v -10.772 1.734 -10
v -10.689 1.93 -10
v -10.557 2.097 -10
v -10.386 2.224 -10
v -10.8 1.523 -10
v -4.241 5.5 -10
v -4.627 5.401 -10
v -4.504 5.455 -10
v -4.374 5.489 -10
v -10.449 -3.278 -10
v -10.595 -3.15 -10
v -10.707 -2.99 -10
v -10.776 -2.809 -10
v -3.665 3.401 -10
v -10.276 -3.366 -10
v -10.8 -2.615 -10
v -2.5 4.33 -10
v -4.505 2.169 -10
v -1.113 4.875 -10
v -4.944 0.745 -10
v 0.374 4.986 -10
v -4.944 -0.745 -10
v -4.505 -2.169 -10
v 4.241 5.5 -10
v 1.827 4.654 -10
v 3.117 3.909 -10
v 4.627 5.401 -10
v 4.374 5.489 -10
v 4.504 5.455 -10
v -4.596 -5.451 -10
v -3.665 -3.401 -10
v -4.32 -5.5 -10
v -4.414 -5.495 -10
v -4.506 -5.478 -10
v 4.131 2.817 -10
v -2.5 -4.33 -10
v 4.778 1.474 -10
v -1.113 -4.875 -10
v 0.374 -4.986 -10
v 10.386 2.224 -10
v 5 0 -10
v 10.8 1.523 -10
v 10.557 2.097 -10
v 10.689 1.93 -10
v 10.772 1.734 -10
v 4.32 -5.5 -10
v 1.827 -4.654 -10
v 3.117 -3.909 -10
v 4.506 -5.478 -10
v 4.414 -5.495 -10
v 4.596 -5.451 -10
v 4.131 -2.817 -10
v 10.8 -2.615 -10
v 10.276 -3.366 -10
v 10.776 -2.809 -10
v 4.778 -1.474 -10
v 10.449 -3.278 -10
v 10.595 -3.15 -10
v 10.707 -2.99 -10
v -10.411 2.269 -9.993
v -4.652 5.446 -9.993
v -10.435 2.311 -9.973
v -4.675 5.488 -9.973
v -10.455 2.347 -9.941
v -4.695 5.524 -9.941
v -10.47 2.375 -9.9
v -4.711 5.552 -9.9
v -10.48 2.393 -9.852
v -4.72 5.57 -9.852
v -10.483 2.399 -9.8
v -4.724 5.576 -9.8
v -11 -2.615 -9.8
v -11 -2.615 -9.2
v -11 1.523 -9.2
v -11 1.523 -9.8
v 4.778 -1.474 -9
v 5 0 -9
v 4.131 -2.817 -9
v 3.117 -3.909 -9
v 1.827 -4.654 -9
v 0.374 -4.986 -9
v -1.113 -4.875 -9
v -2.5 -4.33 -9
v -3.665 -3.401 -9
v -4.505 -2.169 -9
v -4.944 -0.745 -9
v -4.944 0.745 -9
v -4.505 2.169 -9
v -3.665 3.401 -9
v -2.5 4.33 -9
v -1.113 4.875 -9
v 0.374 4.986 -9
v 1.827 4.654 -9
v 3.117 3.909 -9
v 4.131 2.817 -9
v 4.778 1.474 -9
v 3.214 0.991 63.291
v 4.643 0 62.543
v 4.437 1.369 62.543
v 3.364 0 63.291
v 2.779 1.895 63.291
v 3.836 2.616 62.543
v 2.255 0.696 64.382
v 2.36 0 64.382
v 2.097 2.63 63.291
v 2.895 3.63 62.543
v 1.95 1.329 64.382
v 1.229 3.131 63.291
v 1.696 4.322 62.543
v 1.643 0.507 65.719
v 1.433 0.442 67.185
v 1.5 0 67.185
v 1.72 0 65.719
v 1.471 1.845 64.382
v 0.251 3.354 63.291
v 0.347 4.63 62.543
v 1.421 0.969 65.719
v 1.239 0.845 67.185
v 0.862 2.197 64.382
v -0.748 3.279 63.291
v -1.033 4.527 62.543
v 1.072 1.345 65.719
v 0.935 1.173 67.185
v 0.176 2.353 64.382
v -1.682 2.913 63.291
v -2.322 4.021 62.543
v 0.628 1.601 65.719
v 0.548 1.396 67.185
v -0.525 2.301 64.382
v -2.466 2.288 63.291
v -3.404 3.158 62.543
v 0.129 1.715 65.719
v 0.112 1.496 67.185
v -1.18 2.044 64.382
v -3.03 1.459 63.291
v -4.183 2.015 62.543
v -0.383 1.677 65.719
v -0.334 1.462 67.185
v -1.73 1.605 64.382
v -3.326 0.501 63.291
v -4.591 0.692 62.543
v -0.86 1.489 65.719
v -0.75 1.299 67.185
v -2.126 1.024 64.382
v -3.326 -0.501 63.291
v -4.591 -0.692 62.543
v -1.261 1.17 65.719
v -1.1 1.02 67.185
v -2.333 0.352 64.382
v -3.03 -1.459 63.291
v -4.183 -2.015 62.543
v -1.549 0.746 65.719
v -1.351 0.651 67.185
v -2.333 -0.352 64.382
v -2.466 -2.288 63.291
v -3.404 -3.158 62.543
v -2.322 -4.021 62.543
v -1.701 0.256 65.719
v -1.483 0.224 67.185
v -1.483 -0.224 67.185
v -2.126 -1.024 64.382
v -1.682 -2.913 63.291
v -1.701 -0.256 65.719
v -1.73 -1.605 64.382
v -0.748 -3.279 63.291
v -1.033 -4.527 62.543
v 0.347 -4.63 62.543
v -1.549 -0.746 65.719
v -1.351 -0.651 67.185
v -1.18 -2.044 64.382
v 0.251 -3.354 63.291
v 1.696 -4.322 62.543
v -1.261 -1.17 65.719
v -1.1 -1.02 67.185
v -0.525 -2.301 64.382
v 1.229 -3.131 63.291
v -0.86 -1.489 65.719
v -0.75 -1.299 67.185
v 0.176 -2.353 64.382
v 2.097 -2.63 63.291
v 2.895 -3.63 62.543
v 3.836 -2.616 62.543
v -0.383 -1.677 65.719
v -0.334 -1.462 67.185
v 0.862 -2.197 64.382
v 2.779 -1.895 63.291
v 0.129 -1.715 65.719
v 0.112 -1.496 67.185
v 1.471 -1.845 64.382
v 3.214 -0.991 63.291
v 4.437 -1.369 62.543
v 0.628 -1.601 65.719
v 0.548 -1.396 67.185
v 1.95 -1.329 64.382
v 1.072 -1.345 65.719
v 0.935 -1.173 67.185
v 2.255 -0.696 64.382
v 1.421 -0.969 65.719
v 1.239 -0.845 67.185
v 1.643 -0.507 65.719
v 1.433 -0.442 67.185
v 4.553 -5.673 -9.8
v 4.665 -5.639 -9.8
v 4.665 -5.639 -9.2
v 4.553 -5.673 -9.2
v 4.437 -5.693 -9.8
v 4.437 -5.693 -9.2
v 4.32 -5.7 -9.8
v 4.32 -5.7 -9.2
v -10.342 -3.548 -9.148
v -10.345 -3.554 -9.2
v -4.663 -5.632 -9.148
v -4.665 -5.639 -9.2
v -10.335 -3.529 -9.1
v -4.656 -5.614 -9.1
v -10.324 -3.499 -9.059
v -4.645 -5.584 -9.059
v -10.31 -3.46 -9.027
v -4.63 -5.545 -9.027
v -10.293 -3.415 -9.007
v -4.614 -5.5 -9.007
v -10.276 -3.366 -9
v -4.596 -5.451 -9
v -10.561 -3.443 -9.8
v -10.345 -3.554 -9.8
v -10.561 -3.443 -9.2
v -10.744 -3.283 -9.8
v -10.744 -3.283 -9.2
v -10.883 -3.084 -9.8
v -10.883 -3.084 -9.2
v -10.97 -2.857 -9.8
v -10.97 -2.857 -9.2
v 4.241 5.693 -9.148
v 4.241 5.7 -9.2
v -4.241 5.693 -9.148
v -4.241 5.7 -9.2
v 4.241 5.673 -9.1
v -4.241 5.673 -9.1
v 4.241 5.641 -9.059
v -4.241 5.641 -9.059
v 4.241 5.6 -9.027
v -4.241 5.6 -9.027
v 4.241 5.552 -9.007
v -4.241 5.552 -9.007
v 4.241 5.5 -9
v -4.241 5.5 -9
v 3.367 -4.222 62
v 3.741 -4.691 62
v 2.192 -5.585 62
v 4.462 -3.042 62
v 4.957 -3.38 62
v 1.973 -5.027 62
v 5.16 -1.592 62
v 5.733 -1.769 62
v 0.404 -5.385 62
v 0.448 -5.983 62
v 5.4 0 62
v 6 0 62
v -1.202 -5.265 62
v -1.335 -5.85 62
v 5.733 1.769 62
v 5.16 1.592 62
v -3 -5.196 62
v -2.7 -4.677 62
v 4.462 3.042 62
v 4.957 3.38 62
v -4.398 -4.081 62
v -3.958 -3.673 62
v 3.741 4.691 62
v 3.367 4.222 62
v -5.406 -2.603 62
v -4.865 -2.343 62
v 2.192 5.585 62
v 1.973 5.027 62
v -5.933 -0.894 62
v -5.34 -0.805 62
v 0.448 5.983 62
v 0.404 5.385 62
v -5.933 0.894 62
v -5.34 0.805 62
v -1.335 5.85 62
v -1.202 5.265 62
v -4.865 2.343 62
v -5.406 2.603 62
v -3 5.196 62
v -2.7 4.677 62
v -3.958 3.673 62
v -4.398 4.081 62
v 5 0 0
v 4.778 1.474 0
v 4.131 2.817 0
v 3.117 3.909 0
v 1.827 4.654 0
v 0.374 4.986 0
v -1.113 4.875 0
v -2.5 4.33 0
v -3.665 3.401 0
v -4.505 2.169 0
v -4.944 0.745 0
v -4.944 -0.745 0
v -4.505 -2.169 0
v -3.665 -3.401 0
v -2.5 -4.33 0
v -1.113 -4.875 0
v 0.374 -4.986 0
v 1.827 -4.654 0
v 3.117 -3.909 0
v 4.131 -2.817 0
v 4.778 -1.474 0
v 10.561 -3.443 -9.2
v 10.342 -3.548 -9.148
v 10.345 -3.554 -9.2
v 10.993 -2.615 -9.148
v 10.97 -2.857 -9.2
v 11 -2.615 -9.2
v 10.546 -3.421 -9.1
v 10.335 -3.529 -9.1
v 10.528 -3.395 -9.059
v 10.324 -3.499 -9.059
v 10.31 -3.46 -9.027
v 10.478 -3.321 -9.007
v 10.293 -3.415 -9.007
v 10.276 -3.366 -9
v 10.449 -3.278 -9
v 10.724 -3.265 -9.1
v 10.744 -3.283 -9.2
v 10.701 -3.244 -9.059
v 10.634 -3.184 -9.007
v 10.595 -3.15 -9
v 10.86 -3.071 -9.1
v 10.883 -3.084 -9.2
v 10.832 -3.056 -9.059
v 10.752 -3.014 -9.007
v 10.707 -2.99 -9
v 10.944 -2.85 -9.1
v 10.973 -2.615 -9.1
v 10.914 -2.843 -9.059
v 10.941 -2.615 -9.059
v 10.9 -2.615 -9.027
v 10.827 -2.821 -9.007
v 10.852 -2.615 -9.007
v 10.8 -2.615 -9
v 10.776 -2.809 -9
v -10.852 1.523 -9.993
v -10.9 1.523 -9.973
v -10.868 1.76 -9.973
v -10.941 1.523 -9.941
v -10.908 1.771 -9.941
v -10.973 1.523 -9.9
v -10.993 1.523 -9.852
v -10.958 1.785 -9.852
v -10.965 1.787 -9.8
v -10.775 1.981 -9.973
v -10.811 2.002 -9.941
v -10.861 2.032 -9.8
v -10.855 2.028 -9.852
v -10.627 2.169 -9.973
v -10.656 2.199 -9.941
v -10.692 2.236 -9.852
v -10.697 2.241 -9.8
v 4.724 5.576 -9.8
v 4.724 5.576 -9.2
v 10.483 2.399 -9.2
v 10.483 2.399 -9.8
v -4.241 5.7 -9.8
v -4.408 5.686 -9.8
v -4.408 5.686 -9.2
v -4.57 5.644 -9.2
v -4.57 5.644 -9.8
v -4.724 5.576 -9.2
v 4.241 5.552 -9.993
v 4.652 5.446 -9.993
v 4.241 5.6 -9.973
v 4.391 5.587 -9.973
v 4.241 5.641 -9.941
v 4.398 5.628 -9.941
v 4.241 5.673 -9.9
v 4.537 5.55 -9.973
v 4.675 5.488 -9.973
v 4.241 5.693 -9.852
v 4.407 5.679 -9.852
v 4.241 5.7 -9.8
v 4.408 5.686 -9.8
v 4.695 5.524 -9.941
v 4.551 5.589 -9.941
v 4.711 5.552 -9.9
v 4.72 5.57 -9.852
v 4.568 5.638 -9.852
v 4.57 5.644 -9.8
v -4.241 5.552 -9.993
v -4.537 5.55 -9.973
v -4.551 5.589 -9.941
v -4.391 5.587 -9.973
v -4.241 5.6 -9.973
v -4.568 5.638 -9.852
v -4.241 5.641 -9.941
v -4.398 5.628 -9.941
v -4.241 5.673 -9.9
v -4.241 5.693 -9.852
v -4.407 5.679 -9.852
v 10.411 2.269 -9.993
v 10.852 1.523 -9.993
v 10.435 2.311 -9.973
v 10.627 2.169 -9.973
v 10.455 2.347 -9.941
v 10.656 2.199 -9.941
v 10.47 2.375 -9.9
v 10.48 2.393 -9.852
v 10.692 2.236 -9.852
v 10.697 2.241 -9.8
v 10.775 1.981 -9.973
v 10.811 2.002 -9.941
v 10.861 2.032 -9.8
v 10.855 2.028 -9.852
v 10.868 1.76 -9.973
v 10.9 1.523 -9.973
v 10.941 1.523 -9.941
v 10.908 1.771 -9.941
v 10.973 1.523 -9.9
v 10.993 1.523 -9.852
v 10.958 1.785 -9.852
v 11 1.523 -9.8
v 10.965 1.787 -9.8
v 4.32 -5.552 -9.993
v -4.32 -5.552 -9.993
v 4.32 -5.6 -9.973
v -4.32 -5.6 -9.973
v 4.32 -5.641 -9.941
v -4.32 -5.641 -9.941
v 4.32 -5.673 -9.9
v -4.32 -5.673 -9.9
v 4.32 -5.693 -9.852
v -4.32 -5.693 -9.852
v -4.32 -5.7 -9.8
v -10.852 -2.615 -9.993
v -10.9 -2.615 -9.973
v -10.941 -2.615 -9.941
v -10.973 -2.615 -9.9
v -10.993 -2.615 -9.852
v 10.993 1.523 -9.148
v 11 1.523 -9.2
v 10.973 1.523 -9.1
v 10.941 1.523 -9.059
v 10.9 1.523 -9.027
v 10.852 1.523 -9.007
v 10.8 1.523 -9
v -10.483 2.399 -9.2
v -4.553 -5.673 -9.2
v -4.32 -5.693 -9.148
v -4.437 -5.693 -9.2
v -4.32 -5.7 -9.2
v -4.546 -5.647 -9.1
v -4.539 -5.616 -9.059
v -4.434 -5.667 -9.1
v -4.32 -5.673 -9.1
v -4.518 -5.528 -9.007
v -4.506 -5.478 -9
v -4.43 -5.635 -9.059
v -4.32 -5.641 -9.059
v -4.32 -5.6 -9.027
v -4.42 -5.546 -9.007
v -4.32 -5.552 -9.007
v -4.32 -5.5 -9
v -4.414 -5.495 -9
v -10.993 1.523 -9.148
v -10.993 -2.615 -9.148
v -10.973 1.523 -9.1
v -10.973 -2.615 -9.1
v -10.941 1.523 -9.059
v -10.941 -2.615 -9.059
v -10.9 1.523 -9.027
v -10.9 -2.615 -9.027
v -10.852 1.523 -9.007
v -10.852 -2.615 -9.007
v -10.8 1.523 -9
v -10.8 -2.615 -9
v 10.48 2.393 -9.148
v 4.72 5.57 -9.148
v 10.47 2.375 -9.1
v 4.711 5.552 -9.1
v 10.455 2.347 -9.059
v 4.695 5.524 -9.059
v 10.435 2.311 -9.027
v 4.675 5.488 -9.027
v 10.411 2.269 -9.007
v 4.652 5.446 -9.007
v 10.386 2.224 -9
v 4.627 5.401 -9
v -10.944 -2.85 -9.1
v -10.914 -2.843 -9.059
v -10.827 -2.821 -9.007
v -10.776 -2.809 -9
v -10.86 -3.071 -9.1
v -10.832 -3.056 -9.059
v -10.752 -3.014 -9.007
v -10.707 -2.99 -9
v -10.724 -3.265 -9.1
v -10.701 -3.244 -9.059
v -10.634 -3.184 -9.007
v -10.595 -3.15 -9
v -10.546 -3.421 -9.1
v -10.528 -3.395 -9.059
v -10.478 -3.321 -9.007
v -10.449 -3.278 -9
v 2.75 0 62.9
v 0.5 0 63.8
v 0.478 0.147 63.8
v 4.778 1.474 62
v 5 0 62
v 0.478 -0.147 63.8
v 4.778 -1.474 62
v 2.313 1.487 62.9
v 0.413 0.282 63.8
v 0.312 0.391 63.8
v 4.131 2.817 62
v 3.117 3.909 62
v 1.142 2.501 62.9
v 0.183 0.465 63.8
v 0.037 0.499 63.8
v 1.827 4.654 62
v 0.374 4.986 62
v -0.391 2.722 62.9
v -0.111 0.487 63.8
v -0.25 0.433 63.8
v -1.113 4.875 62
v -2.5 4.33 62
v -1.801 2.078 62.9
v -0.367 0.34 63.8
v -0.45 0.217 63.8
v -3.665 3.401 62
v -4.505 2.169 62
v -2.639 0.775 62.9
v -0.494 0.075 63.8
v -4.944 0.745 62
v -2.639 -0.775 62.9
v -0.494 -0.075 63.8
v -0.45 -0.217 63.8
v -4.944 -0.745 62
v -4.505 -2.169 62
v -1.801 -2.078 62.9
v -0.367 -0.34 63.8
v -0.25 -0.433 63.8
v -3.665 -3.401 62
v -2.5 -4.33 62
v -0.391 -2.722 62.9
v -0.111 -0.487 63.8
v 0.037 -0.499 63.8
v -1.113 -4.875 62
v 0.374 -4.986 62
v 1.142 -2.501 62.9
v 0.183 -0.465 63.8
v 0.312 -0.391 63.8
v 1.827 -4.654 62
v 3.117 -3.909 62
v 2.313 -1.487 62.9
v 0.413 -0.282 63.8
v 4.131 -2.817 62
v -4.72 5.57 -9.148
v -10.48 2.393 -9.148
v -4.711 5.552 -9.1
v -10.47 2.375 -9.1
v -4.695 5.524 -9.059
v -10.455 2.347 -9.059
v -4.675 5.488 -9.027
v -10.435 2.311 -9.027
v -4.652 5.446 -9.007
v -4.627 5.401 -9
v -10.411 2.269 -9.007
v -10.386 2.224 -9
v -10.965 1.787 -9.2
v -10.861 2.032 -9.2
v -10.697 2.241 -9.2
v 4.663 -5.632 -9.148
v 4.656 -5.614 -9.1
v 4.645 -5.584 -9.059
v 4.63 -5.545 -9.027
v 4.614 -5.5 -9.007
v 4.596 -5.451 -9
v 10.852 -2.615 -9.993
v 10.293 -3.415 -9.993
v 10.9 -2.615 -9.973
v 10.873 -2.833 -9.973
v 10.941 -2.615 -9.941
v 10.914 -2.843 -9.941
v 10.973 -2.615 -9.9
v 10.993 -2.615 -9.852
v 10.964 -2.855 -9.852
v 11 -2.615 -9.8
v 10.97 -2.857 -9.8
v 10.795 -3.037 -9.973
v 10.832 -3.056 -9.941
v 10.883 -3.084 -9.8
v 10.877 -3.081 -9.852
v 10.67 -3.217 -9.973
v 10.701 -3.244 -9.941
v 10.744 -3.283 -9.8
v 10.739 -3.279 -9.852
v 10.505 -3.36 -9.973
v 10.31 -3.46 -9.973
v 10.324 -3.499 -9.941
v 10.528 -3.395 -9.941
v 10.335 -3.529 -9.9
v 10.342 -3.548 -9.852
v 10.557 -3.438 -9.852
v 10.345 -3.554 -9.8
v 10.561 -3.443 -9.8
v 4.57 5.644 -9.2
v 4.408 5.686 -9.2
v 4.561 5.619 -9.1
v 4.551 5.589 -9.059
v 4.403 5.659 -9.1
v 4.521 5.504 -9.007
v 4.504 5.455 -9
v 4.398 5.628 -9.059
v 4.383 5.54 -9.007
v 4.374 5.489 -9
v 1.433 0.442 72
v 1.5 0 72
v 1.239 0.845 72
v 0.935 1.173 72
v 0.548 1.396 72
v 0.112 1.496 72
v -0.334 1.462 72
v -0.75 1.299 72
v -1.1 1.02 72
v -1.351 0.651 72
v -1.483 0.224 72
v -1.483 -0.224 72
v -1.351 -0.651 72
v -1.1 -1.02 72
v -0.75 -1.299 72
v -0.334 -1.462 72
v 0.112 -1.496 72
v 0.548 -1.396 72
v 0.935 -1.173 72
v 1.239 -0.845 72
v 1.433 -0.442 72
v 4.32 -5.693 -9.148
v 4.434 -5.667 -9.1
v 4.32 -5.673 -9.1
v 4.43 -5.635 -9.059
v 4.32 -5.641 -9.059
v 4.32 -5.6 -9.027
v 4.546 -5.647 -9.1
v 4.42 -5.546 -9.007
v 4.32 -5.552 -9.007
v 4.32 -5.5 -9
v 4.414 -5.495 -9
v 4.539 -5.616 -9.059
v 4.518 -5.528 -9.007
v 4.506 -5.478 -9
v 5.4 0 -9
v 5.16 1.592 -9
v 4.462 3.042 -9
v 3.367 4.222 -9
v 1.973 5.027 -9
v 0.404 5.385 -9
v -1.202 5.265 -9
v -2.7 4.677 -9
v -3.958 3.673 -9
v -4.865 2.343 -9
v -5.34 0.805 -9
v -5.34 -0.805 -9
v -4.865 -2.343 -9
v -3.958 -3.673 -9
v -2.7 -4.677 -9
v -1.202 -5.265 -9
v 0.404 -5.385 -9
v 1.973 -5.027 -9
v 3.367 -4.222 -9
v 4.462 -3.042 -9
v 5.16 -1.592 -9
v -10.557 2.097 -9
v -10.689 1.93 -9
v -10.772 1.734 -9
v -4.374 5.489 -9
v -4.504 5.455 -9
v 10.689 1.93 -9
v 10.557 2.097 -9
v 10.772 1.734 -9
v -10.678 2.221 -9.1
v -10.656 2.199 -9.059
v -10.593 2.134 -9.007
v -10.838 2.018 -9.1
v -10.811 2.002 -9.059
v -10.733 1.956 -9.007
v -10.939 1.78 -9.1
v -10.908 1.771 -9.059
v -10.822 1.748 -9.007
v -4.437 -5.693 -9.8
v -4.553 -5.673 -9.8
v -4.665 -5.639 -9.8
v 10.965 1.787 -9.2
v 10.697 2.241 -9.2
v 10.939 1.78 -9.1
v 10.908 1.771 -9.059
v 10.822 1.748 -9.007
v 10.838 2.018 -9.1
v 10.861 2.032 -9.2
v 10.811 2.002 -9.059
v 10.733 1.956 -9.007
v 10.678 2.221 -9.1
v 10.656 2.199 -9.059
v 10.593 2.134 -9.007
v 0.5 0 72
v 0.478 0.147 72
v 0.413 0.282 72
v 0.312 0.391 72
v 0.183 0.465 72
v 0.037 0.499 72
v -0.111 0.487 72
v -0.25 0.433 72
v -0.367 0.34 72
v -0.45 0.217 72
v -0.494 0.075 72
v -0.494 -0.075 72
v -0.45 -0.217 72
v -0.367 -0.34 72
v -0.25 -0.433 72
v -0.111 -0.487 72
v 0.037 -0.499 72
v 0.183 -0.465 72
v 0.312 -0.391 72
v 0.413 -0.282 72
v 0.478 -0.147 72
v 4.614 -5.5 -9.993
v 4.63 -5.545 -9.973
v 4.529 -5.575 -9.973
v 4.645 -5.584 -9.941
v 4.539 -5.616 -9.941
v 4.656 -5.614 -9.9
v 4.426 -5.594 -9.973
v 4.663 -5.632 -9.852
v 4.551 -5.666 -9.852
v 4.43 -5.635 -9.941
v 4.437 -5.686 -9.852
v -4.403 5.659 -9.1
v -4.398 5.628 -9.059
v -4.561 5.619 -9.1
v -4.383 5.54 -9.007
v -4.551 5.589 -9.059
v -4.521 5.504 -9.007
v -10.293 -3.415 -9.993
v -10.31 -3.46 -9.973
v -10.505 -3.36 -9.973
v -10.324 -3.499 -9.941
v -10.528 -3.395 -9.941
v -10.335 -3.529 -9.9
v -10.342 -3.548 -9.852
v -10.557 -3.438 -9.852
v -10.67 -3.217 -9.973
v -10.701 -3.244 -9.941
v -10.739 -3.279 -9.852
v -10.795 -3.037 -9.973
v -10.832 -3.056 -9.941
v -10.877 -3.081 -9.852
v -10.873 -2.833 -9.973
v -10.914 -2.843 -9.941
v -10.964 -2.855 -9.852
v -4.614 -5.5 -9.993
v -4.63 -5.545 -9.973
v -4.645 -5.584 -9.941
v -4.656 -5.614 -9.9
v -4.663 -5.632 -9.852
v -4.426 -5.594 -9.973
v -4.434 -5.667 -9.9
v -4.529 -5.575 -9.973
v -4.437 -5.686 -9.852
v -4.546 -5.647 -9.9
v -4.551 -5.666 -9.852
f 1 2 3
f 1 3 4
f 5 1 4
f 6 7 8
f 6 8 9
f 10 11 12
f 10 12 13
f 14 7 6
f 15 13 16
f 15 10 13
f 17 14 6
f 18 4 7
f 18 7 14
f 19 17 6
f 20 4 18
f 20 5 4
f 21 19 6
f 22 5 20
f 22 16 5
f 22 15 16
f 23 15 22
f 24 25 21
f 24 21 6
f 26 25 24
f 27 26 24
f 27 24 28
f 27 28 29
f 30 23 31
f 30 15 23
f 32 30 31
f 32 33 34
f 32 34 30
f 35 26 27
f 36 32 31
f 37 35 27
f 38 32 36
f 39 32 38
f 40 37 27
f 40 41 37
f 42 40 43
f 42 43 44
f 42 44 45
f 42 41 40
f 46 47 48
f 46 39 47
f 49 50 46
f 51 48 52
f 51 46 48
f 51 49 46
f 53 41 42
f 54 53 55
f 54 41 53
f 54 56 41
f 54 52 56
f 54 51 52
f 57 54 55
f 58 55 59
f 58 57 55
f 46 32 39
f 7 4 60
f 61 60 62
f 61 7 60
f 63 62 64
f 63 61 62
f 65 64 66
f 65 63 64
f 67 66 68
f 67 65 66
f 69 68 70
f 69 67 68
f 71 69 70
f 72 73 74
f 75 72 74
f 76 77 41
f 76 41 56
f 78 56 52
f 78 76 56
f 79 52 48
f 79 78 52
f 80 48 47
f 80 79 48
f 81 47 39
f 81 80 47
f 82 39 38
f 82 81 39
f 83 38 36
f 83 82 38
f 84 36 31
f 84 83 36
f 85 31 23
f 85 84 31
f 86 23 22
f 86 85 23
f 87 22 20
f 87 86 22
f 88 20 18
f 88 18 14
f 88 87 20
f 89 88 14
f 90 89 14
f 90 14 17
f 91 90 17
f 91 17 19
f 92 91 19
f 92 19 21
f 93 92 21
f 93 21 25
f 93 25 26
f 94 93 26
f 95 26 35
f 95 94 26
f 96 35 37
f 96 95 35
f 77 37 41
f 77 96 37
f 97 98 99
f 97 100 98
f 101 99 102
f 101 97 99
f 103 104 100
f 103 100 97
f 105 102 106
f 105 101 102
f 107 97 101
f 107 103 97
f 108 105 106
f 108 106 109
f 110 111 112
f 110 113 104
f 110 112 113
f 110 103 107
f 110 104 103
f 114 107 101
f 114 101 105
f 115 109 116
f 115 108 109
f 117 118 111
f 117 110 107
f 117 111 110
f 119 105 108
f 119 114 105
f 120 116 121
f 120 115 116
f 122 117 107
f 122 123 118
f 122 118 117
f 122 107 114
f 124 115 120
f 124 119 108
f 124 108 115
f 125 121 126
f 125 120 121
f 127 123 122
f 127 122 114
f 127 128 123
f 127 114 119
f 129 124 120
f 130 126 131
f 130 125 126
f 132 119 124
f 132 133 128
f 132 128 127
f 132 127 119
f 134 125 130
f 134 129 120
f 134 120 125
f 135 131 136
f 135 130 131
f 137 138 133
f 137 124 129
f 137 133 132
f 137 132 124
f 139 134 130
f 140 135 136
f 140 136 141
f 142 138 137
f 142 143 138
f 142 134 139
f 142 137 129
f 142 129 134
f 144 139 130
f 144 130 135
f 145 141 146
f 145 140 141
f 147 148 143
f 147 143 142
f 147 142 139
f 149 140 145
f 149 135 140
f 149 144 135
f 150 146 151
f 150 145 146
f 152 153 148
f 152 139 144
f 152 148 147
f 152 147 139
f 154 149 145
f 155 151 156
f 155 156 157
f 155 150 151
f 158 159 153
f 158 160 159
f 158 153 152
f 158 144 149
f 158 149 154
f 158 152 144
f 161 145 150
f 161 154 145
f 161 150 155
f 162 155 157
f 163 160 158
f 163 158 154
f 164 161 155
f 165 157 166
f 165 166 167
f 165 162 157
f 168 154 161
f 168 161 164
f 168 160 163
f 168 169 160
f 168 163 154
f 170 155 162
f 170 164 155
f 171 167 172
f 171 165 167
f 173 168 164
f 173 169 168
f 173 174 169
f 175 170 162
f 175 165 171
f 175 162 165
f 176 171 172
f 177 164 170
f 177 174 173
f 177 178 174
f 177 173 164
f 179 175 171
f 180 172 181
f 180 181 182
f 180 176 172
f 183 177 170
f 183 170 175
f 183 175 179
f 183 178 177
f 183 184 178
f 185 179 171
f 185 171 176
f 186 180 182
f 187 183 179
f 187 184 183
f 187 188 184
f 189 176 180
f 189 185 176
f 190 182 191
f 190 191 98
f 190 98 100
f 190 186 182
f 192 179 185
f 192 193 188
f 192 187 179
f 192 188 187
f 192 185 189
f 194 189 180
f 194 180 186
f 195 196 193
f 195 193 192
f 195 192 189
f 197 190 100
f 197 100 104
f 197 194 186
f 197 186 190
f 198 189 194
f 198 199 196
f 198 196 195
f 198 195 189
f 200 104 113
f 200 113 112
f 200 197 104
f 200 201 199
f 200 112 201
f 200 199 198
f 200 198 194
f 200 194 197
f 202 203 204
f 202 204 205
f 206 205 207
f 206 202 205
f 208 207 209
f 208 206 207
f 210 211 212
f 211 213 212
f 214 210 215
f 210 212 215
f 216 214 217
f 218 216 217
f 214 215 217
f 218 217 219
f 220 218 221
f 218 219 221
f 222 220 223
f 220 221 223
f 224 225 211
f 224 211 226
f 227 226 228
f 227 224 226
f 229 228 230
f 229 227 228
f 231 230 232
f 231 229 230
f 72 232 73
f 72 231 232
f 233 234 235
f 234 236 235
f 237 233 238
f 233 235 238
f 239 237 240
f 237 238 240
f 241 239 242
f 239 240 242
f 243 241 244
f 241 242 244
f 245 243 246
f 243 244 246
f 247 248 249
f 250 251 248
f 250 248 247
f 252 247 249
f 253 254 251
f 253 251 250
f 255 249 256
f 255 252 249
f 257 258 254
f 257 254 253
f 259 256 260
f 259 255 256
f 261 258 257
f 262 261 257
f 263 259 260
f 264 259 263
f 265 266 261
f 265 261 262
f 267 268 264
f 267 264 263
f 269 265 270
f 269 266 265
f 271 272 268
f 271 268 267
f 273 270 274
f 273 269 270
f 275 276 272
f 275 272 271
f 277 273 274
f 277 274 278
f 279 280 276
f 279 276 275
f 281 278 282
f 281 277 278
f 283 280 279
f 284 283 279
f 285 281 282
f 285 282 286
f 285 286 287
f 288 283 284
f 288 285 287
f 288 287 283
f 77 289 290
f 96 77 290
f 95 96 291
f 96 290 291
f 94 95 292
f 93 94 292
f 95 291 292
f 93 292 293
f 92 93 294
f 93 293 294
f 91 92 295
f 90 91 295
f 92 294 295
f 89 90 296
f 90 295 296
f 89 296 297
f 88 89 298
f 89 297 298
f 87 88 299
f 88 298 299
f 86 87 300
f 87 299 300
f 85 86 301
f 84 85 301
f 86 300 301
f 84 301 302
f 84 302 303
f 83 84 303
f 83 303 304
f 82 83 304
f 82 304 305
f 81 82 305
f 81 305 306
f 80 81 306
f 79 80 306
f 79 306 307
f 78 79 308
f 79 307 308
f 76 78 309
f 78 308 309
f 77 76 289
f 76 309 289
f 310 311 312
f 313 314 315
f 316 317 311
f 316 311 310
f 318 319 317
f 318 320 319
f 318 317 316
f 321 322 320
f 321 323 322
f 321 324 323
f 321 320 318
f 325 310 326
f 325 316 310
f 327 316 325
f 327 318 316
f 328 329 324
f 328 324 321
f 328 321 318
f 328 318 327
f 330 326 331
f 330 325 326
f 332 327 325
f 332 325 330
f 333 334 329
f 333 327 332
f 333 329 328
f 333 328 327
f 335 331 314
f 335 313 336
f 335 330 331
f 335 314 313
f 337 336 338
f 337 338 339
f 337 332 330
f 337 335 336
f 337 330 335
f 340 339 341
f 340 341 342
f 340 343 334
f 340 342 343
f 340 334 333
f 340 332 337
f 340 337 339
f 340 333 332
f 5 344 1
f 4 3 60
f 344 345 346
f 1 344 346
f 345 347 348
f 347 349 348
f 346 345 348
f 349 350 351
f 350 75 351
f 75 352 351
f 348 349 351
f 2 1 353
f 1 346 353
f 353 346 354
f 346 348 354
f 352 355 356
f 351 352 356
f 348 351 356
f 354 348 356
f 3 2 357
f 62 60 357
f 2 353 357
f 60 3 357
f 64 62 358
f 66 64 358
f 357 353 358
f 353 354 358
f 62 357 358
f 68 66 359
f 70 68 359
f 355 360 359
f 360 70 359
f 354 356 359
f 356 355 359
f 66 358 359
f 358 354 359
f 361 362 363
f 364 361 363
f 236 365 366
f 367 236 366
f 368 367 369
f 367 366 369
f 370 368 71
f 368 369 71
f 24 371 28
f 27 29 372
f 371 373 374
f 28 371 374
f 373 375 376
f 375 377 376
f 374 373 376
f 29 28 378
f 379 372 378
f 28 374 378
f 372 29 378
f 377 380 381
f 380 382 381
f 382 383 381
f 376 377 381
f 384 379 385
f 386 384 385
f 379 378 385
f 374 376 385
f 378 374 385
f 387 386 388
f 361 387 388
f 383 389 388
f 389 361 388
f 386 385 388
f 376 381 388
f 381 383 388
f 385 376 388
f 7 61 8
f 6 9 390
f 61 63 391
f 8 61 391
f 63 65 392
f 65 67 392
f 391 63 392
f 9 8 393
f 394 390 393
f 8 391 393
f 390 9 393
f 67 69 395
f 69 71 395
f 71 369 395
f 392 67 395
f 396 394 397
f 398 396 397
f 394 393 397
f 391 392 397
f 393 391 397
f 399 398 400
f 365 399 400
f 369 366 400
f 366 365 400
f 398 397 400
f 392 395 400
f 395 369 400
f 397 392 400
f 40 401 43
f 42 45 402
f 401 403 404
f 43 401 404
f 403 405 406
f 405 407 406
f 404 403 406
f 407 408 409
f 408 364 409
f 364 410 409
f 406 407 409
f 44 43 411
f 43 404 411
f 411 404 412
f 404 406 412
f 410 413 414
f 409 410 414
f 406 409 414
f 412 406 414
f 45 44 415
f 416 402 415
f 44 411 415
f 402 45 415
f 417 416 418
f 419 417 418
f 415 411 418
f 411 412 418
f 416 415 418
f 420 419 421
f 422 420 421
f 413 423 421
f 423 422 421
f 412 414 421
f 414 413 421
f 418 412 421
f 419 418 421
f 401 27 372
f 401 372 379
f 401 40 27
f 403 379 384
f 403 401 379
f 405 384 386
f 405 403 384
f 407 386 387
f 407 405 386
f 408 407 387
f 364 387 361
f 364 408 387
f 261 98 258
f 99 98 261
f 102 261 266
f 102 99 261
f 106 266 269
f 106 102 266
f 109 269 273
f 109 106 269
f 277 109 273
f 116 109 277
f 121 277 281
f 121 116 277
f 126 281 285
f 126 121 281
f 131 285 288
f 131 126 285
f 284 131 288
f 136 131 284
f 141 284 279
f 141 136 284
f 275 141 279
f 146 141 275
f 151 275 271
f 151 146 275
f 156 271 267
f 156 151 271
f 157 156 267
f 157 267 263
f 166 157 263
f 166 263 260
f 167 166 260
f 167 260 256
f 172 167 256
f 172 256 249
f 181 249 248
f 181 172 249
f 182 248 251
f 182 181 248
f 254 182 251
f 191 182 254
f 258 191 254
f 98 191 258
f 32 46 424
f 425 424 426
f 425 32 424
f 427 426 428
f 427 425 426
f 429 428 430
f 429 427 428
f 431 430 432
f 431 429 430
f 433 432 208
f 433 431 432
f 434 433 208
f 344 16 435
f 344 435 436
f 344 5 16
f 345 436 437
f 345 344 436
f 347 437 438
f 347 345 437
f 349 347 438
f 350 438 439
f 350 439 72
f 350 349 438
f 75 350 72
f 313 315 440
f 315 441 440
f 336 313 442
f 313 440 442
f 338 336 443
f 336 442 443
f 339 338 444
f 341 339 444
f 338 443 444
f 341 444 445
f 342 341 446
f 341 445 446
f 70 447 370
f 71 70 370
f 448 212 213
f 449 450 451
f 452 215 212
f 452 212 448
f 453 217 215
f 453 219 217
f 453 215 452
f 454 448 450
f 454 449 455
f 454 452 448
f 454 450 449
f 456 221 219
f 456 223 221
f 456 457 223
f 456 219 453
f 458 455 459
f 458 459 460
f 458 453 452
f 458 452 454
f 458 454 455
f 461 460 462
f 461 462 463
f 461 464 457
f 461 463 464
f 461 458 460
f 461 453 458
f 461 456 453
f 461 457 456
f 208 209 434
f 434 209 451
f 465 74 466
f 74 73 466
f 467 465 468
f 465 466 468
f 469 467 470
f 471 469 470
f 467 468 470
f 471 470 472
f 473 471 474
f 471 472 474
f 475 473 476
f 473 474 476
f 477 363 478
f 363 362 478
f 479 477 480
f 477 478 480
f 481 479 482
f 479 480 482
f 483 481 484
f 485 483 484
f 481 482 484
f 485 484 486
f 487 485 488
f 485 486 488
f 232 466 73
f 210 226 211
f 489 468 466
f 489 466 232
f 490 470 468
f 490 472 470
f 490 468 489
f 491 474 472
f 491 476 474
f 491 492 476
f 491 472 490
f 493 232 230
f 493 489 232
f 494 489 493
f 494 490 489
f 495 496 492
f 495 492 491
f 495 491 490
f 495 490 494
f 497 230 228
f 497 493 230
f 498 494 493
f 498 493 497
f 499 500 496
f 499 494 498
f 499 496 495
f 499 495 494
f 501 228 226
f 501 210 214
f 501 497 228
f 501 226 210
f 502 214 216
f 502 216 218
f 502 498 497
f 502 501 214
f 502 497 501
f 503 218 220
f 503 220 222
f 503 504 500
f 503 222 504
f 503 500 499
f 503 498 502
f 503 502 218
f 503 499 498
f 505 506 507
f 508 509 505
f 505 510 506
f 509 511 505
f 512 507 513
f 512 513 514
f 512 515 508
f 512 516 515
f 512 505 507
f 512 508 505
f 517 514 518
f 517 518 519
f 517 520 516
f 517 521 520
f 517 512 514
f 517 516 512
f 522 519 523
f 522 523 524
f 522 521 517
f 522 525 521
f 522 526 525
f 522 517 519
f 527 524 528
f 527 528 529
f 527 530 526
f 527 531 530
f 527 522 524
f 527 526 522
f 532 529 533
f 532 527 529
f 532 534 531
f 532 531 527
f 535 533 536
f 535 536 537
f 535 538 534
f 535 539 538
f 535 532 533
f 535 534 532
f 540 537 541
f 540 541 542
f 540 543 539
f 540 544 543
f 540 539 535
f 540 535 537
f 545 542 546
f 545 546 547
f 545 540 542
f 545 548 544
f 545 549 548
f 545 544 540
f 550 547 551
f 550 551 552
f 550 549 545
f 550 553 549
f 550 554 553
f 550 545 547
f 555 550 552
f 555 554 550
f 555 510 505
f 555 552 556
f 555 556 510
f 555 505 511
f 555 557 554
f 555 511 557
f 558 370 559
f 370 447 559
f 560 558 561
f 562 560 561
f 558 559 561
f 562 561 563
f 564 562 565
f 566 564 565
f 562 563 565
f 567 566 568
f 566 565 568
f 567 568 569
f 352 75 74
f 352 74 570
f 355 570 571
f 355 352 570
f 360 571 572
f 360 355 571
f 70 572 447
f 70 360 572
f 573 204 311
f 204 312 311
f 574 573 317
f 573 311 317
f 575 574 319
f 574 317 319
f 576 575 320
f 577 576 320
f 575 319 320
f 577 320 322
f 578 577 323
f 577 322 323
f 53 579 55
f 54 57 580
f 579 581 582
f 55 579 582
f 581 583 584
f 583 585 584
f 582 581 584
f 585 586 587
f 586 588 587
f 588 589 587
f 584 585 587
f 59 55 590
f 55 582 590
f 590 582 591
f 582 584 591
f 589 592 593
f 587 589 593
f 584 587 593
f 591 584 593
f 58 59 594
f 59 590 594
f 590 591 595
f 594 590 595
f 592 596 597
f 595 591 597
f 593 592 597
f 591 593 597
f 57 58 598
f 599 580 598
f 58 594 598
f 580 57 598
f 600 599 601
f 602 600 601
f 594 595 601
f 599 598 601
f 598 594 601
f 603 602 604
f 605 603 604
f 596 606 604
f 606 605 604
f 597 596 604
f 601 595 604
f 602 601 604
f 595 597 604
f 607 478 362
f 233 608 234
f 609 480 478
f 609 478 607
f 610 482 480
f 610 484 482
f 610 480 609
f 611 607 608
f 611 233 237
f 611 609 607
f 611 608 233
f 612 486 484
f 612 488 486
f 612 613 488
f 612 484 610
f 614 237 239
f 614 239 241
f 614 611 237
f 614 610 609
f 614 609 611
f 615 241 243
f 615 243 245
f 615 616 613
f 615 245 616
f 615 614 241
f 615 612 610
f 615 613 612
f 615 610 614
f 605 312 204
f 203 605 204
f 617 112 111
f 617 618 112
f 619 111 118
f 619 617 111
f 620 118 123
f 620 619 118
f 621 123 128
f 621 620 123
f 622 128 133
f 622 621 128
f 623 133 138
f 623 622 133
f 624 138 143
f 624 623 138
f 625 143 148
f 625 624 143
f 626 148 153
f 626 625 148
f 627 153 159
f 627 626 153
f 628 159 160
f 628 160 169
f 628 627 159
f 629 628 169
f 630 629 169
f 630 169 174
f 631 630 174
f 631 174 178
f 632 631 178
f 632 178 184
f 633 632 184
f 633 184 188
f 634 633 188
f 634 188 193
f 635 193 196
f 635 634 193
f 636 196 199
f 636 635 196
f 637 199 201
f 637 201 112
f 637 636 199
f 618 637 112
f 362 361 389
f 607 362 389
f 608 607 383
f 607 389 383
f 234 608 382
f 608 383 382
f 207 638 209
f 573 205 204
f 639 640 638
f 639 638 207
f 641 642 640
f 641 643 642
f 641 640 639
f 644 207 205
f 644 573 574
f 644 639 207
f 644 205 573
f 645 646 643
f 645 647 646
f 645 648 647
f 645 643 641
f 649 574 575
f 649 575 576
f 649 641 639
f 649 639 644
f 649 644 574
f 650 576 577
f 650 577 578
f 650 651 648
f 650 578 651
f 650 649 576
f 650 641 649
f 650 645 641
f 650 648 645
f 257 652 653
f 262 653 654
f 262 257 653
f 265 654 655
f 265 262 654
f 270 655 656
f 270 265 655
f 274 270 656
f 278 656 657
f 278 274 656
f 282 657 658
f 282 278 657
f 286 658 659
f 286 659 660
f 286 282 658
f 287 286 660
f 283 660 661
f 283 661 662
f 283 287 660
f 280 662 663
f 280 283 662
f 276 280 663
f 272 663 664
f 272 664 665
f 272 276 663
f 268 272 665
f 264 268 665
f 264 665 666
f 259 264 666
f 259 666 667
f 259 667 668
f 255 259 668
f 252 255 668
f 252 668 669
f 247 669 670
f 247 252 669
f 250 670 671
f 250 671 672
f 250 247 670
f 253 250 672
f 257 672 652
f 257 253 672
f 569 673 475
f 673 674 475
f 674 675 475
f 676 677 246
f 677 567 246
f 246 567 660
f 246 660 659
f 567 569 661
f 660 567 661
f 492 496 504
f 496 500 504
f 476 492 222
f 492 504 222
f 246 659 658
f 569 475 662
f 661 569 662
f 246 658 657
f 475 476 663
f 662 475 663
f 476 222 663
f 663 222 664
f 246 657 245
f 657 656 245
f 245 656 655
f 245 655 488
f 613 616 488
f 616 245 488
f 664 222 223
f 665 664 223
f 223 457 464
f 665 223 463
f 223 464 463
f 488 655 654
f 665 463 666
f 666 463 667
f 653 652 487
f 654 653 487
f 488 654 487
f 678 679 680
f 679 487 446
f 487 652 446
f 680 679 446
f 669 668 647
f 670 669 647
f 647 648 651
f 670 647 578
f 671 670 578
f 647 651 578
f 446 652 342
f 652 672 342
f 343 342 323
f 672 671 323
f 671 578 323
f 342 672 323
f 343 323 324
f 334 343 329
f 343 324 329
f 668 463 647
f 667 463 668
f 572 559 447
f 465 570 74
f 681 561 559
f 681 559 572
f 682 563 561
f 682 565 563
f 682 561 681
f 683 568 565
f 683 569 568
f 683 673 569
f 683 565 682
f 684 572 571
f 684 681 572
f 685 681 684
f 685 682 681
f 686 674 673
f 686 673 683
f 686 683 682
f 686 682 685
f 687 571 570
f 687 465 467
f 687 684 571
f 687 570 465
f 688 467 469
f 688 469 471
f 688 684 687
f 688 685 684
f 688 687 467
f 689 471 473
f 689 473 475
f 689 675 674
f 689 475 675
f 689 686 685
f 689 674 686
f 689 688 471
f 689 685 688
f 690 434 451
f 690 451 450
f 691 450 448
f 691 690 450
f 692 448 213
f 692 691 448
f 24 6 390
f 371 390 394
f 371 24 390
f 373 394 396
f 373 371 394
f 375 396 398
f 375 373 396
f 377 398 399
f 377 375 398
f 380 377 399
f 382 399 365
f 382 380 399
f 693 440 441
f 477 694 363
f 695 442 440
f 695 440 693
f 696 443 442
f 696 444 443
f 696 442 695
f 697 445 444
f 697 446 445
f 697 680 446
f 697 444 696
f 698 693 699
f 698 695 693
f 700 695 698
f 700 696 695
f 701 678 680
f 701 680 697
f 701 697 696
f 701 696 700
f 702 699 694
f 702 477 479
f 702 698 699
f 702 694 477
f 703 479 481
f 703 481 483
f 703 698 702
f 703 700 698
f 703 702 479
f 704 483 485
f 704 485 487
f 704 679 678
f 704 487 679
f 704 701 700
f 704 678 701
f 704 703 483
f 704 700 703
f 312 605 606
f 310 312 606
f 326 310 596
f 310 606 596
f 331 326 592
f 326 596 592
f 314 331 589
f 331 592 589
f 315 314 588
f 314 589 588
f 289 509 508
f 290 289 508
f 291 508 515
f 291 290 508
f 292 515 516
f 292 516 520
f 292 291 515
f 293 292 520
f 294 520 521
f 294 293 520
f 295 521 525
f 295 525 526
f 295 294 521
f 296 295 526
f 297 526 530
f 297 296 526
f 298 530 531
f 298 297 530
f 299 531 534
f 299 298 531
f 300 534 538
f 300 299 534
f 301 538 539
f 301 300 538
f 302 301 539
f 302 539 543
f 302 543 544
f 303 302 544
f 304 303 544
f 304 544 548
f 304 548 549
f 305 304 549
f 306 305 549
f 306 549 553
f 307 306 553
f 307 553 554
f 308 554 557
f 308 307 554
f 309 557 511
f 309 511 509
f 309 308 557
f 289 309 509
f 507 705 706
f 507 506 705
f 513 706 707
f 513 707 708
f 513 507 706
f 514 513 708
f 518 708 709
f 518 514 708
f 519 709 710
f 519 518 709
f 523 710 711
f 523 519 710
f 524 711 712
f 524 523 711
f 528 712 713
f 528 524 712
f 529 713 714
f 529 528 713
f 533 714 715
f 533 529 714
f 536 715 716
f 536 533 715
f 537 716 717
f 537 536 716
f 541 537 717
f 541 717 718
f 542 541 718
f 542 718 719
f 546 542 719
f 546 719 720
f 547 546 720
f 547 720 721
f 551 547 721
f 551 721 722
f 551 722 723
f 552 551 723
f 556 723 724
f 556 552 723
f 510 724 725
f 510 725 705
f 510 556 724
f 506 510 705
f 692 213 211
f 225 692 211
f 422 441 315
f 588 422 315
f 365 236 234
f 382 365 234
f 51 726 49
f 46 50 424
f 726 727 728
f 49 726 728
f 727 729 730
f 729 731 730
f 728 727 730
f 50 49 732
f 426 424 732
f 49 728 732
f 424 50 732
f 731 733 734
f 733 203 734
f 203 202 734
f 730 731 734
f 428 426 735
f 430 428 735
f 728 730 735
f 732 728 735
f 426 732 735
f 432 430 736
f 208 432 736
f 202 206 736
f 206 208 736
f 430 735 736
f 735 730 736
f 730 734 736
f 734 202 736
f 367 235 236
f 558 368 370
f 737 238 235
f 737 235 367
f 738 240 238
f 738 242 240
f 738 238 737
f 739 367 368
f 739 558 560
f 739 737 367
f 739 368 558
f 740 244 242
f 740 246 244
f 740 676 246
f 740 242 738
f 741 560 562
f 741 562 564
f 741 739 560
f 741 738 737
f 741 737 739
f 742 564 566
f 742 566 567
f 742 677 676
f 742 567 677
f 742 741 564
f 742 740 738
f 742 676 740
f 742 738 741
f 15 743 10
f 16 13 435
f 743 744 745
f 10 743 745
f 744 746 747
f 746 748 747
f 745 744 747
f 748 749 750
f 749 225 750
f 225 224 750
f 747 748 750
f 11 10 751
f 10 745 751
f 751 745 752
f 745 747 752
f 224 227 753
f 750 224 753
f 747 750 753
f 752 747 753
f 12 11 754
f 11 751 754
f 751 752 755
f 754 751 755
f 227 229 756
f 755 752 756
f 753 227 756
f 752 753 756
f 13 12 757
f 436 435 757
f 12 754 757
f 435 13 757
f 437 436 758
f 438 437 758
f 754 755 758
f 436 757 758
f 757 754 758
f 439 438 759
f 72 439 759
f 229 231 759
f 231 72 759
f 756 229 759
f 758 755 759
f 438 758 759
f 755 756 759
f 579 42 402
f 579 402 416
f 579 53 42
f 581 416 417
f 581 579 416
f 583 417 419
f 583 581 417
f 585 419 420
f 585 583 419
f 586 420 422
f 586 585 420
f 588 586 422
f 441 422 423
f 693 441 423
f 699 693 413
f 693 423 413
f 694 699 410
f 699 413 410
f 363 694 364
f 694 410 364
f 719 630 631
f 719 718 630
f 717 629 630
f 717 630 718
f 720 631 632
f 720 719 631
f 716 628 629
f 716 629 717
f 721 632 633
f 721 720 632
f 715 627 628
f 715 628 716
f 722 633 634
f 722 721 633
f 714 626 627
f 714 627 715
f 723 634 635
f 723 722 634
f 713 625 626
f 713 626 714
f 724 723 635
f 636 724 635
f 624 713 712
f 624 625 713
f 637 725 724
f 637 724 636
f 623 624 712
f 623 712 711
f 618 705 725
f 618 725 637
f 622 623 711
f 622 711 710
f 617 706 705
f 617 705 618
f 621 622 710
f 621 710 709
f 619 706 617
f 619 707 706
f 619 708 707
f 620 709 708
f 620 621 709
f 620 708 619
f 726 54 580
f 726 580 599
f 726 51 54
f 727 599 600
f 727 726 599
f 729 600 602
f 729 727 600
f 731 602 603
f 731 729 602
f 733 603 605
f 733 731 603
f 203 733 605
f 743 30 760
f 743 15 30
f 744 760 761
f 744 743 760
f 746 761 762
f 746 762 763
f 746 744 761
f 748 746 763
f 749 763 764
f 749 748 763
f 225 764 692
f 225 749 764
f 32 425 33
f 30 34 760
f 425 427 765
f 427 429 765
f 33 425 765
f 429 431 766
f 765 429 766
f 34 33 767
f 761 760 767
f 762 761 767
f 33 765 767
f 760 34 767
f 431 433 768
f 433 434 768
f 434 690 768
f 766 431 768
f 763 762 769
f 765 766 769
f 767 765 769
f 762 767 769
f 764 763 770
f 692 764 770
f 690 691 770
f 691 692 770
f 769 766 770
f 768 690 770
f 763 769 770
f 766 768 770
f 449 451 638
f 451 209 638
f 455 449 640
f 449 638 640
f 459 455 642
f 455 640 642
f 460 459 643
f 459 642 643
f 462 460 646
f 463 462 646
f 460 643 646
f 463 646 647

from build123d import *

# Parameters (mm, degrees)
F0_R          = 5.4
F0_R_2        = 5
F1_DEPTH      = 62
F1_DEPTH_BACK = 9
F5_R          = 5
F6_DEPTH      = 1
F7_R          = 1
F8_R          = 0.2
F9_R          = 0.2


# Not quite as in the source:
# - a feature names something its author has since deleted; it is built from what else it names


with BuildPart() as f1:
    # F0 (on Top) → F1 (new body, two sides)
    with BuildSketch(Plane.XY) as f1_sk:
        Circle(F0_R)
        Circle(F0_R_2, mode=Mode.SUBTRACT)
    extrude(amount=F1_DEPTH)
    extrude(f1_sk.sketch, amount=-F1_DEPTH_BACK)

    # F2 (on Front) → F3 (revolve)
    with BuildSketch(Plane.XZ):
        with BuildLine():
            Line((6, 62), (4.6430466171, 62.5427813535))
            ThreePointArc((4.6430466171, 62.5427813535), (2.3596638473, 64.3820207615), (1.5, 67.1851648075))
            Line((1.5, 67.1851648075), (1.5, 72))
            Line((1.5, 72), (0.5, 72))
            Line((0.5, 72), (0.5, 63.8000000012))
            Line((0.5, 63.8000000012), (5, 62))
            Line((5, 62), (6, 62))
        make_face()
    revolve(axis=Axis((0, 0, 62.4439572394), (0, 0, 1)))

    # F5 (on offset) → F6 (join)
    with BuildSketch(Plane(origin=(0, 0, -9), x_dir=(1, 0, 0), z_dir=(0, 0, -1))):
        Polygon((11, 3.3135847191), (4.4980677776, 5.7), (-4.4980677776, 5.7), (-11, 3.3135847191), (-11, -2.1135847191), (-4.4980677776, -5.7), (4.4980677776, -5.7), (11, -2.1135847191), align=None)
        Circle(F5_R, mode=Mode.SUBTRACT)
    extrude(amount=F6_DEPTH)

    # F7
    f7_edges = [f1.edges().sort_by_distance(p)[0] for p in [
        (11, 2.113585, -9.5),
        (11, -3.313585, -9.5),
        (4.498068, 5.7, -9.5),
        (4.498068, -5.7, -9.5),
        (-4.498068, 5.7, -9.5),
        (-4.498068, -5.7, -9.5),
        (-11, 2.113585, -9.5),
        (-11, -3.313585, -9.5),
    ]]
    fillet(f7_edges, radius=F7_R)

    # F8
    f8_edges = [f1.edges().sort_by_distance(p)[0] for p in [
        (-7.504731, -4.596459, -10),
        (-4.495326, -5.684572, -10),
        (0, -5.7, -10),
        (-11, -0.546125, -10),
        (-10.819926, -3.187857, -10),
        (-10.861101, 2.031572, -10),
        (-7.603269, 3.987195, -10),
        (-4.489932, 5.668408, -10),
        (0, 5.7, -10),
        (4.489932, 5.668408, -10),
        (7.603269, 3.987195, -10),
        (7.504731, -4.596459, -10),
        (4.495326, -5.684572, -10),
        (10.819926, -3.187857, -10),
        (11, -0.546125, -10),
        (10.861101, 2.031572, -10),
    ]]
    fillet(f8_edges, radius=F8_R)

    # F9
    f9_edges = [f1.edges().sort_by_distance(p)[0] for p in [
        (10.819926, -3.187857, -9),
        (11, -0.546125, -9),
        (10.861101, 2.031572, -9),
        (7.603269, 3.987195, -9),
        (4.489932, 5.668408, -9),
        (0, 5.7, -9),
        (-4.489932, 5.668408, -9),
        (-10.861101, 2.031572, -9),
        (-7.603269, 3.987195, -9),
        (7.504731, -4.596459, -9),
        (0, -5.7, -9),
        (-11, -0.546125, -9),
        (-10.819926, -3.187857, -9),
        (-4.495326, -5.684572, -9),
        (4.495326, -5.684572, -9),
        (-7.504731, -4.596459, -9),
    ]]
    fillet(f9_edges, radius=F9_R)


solid = f1.part
